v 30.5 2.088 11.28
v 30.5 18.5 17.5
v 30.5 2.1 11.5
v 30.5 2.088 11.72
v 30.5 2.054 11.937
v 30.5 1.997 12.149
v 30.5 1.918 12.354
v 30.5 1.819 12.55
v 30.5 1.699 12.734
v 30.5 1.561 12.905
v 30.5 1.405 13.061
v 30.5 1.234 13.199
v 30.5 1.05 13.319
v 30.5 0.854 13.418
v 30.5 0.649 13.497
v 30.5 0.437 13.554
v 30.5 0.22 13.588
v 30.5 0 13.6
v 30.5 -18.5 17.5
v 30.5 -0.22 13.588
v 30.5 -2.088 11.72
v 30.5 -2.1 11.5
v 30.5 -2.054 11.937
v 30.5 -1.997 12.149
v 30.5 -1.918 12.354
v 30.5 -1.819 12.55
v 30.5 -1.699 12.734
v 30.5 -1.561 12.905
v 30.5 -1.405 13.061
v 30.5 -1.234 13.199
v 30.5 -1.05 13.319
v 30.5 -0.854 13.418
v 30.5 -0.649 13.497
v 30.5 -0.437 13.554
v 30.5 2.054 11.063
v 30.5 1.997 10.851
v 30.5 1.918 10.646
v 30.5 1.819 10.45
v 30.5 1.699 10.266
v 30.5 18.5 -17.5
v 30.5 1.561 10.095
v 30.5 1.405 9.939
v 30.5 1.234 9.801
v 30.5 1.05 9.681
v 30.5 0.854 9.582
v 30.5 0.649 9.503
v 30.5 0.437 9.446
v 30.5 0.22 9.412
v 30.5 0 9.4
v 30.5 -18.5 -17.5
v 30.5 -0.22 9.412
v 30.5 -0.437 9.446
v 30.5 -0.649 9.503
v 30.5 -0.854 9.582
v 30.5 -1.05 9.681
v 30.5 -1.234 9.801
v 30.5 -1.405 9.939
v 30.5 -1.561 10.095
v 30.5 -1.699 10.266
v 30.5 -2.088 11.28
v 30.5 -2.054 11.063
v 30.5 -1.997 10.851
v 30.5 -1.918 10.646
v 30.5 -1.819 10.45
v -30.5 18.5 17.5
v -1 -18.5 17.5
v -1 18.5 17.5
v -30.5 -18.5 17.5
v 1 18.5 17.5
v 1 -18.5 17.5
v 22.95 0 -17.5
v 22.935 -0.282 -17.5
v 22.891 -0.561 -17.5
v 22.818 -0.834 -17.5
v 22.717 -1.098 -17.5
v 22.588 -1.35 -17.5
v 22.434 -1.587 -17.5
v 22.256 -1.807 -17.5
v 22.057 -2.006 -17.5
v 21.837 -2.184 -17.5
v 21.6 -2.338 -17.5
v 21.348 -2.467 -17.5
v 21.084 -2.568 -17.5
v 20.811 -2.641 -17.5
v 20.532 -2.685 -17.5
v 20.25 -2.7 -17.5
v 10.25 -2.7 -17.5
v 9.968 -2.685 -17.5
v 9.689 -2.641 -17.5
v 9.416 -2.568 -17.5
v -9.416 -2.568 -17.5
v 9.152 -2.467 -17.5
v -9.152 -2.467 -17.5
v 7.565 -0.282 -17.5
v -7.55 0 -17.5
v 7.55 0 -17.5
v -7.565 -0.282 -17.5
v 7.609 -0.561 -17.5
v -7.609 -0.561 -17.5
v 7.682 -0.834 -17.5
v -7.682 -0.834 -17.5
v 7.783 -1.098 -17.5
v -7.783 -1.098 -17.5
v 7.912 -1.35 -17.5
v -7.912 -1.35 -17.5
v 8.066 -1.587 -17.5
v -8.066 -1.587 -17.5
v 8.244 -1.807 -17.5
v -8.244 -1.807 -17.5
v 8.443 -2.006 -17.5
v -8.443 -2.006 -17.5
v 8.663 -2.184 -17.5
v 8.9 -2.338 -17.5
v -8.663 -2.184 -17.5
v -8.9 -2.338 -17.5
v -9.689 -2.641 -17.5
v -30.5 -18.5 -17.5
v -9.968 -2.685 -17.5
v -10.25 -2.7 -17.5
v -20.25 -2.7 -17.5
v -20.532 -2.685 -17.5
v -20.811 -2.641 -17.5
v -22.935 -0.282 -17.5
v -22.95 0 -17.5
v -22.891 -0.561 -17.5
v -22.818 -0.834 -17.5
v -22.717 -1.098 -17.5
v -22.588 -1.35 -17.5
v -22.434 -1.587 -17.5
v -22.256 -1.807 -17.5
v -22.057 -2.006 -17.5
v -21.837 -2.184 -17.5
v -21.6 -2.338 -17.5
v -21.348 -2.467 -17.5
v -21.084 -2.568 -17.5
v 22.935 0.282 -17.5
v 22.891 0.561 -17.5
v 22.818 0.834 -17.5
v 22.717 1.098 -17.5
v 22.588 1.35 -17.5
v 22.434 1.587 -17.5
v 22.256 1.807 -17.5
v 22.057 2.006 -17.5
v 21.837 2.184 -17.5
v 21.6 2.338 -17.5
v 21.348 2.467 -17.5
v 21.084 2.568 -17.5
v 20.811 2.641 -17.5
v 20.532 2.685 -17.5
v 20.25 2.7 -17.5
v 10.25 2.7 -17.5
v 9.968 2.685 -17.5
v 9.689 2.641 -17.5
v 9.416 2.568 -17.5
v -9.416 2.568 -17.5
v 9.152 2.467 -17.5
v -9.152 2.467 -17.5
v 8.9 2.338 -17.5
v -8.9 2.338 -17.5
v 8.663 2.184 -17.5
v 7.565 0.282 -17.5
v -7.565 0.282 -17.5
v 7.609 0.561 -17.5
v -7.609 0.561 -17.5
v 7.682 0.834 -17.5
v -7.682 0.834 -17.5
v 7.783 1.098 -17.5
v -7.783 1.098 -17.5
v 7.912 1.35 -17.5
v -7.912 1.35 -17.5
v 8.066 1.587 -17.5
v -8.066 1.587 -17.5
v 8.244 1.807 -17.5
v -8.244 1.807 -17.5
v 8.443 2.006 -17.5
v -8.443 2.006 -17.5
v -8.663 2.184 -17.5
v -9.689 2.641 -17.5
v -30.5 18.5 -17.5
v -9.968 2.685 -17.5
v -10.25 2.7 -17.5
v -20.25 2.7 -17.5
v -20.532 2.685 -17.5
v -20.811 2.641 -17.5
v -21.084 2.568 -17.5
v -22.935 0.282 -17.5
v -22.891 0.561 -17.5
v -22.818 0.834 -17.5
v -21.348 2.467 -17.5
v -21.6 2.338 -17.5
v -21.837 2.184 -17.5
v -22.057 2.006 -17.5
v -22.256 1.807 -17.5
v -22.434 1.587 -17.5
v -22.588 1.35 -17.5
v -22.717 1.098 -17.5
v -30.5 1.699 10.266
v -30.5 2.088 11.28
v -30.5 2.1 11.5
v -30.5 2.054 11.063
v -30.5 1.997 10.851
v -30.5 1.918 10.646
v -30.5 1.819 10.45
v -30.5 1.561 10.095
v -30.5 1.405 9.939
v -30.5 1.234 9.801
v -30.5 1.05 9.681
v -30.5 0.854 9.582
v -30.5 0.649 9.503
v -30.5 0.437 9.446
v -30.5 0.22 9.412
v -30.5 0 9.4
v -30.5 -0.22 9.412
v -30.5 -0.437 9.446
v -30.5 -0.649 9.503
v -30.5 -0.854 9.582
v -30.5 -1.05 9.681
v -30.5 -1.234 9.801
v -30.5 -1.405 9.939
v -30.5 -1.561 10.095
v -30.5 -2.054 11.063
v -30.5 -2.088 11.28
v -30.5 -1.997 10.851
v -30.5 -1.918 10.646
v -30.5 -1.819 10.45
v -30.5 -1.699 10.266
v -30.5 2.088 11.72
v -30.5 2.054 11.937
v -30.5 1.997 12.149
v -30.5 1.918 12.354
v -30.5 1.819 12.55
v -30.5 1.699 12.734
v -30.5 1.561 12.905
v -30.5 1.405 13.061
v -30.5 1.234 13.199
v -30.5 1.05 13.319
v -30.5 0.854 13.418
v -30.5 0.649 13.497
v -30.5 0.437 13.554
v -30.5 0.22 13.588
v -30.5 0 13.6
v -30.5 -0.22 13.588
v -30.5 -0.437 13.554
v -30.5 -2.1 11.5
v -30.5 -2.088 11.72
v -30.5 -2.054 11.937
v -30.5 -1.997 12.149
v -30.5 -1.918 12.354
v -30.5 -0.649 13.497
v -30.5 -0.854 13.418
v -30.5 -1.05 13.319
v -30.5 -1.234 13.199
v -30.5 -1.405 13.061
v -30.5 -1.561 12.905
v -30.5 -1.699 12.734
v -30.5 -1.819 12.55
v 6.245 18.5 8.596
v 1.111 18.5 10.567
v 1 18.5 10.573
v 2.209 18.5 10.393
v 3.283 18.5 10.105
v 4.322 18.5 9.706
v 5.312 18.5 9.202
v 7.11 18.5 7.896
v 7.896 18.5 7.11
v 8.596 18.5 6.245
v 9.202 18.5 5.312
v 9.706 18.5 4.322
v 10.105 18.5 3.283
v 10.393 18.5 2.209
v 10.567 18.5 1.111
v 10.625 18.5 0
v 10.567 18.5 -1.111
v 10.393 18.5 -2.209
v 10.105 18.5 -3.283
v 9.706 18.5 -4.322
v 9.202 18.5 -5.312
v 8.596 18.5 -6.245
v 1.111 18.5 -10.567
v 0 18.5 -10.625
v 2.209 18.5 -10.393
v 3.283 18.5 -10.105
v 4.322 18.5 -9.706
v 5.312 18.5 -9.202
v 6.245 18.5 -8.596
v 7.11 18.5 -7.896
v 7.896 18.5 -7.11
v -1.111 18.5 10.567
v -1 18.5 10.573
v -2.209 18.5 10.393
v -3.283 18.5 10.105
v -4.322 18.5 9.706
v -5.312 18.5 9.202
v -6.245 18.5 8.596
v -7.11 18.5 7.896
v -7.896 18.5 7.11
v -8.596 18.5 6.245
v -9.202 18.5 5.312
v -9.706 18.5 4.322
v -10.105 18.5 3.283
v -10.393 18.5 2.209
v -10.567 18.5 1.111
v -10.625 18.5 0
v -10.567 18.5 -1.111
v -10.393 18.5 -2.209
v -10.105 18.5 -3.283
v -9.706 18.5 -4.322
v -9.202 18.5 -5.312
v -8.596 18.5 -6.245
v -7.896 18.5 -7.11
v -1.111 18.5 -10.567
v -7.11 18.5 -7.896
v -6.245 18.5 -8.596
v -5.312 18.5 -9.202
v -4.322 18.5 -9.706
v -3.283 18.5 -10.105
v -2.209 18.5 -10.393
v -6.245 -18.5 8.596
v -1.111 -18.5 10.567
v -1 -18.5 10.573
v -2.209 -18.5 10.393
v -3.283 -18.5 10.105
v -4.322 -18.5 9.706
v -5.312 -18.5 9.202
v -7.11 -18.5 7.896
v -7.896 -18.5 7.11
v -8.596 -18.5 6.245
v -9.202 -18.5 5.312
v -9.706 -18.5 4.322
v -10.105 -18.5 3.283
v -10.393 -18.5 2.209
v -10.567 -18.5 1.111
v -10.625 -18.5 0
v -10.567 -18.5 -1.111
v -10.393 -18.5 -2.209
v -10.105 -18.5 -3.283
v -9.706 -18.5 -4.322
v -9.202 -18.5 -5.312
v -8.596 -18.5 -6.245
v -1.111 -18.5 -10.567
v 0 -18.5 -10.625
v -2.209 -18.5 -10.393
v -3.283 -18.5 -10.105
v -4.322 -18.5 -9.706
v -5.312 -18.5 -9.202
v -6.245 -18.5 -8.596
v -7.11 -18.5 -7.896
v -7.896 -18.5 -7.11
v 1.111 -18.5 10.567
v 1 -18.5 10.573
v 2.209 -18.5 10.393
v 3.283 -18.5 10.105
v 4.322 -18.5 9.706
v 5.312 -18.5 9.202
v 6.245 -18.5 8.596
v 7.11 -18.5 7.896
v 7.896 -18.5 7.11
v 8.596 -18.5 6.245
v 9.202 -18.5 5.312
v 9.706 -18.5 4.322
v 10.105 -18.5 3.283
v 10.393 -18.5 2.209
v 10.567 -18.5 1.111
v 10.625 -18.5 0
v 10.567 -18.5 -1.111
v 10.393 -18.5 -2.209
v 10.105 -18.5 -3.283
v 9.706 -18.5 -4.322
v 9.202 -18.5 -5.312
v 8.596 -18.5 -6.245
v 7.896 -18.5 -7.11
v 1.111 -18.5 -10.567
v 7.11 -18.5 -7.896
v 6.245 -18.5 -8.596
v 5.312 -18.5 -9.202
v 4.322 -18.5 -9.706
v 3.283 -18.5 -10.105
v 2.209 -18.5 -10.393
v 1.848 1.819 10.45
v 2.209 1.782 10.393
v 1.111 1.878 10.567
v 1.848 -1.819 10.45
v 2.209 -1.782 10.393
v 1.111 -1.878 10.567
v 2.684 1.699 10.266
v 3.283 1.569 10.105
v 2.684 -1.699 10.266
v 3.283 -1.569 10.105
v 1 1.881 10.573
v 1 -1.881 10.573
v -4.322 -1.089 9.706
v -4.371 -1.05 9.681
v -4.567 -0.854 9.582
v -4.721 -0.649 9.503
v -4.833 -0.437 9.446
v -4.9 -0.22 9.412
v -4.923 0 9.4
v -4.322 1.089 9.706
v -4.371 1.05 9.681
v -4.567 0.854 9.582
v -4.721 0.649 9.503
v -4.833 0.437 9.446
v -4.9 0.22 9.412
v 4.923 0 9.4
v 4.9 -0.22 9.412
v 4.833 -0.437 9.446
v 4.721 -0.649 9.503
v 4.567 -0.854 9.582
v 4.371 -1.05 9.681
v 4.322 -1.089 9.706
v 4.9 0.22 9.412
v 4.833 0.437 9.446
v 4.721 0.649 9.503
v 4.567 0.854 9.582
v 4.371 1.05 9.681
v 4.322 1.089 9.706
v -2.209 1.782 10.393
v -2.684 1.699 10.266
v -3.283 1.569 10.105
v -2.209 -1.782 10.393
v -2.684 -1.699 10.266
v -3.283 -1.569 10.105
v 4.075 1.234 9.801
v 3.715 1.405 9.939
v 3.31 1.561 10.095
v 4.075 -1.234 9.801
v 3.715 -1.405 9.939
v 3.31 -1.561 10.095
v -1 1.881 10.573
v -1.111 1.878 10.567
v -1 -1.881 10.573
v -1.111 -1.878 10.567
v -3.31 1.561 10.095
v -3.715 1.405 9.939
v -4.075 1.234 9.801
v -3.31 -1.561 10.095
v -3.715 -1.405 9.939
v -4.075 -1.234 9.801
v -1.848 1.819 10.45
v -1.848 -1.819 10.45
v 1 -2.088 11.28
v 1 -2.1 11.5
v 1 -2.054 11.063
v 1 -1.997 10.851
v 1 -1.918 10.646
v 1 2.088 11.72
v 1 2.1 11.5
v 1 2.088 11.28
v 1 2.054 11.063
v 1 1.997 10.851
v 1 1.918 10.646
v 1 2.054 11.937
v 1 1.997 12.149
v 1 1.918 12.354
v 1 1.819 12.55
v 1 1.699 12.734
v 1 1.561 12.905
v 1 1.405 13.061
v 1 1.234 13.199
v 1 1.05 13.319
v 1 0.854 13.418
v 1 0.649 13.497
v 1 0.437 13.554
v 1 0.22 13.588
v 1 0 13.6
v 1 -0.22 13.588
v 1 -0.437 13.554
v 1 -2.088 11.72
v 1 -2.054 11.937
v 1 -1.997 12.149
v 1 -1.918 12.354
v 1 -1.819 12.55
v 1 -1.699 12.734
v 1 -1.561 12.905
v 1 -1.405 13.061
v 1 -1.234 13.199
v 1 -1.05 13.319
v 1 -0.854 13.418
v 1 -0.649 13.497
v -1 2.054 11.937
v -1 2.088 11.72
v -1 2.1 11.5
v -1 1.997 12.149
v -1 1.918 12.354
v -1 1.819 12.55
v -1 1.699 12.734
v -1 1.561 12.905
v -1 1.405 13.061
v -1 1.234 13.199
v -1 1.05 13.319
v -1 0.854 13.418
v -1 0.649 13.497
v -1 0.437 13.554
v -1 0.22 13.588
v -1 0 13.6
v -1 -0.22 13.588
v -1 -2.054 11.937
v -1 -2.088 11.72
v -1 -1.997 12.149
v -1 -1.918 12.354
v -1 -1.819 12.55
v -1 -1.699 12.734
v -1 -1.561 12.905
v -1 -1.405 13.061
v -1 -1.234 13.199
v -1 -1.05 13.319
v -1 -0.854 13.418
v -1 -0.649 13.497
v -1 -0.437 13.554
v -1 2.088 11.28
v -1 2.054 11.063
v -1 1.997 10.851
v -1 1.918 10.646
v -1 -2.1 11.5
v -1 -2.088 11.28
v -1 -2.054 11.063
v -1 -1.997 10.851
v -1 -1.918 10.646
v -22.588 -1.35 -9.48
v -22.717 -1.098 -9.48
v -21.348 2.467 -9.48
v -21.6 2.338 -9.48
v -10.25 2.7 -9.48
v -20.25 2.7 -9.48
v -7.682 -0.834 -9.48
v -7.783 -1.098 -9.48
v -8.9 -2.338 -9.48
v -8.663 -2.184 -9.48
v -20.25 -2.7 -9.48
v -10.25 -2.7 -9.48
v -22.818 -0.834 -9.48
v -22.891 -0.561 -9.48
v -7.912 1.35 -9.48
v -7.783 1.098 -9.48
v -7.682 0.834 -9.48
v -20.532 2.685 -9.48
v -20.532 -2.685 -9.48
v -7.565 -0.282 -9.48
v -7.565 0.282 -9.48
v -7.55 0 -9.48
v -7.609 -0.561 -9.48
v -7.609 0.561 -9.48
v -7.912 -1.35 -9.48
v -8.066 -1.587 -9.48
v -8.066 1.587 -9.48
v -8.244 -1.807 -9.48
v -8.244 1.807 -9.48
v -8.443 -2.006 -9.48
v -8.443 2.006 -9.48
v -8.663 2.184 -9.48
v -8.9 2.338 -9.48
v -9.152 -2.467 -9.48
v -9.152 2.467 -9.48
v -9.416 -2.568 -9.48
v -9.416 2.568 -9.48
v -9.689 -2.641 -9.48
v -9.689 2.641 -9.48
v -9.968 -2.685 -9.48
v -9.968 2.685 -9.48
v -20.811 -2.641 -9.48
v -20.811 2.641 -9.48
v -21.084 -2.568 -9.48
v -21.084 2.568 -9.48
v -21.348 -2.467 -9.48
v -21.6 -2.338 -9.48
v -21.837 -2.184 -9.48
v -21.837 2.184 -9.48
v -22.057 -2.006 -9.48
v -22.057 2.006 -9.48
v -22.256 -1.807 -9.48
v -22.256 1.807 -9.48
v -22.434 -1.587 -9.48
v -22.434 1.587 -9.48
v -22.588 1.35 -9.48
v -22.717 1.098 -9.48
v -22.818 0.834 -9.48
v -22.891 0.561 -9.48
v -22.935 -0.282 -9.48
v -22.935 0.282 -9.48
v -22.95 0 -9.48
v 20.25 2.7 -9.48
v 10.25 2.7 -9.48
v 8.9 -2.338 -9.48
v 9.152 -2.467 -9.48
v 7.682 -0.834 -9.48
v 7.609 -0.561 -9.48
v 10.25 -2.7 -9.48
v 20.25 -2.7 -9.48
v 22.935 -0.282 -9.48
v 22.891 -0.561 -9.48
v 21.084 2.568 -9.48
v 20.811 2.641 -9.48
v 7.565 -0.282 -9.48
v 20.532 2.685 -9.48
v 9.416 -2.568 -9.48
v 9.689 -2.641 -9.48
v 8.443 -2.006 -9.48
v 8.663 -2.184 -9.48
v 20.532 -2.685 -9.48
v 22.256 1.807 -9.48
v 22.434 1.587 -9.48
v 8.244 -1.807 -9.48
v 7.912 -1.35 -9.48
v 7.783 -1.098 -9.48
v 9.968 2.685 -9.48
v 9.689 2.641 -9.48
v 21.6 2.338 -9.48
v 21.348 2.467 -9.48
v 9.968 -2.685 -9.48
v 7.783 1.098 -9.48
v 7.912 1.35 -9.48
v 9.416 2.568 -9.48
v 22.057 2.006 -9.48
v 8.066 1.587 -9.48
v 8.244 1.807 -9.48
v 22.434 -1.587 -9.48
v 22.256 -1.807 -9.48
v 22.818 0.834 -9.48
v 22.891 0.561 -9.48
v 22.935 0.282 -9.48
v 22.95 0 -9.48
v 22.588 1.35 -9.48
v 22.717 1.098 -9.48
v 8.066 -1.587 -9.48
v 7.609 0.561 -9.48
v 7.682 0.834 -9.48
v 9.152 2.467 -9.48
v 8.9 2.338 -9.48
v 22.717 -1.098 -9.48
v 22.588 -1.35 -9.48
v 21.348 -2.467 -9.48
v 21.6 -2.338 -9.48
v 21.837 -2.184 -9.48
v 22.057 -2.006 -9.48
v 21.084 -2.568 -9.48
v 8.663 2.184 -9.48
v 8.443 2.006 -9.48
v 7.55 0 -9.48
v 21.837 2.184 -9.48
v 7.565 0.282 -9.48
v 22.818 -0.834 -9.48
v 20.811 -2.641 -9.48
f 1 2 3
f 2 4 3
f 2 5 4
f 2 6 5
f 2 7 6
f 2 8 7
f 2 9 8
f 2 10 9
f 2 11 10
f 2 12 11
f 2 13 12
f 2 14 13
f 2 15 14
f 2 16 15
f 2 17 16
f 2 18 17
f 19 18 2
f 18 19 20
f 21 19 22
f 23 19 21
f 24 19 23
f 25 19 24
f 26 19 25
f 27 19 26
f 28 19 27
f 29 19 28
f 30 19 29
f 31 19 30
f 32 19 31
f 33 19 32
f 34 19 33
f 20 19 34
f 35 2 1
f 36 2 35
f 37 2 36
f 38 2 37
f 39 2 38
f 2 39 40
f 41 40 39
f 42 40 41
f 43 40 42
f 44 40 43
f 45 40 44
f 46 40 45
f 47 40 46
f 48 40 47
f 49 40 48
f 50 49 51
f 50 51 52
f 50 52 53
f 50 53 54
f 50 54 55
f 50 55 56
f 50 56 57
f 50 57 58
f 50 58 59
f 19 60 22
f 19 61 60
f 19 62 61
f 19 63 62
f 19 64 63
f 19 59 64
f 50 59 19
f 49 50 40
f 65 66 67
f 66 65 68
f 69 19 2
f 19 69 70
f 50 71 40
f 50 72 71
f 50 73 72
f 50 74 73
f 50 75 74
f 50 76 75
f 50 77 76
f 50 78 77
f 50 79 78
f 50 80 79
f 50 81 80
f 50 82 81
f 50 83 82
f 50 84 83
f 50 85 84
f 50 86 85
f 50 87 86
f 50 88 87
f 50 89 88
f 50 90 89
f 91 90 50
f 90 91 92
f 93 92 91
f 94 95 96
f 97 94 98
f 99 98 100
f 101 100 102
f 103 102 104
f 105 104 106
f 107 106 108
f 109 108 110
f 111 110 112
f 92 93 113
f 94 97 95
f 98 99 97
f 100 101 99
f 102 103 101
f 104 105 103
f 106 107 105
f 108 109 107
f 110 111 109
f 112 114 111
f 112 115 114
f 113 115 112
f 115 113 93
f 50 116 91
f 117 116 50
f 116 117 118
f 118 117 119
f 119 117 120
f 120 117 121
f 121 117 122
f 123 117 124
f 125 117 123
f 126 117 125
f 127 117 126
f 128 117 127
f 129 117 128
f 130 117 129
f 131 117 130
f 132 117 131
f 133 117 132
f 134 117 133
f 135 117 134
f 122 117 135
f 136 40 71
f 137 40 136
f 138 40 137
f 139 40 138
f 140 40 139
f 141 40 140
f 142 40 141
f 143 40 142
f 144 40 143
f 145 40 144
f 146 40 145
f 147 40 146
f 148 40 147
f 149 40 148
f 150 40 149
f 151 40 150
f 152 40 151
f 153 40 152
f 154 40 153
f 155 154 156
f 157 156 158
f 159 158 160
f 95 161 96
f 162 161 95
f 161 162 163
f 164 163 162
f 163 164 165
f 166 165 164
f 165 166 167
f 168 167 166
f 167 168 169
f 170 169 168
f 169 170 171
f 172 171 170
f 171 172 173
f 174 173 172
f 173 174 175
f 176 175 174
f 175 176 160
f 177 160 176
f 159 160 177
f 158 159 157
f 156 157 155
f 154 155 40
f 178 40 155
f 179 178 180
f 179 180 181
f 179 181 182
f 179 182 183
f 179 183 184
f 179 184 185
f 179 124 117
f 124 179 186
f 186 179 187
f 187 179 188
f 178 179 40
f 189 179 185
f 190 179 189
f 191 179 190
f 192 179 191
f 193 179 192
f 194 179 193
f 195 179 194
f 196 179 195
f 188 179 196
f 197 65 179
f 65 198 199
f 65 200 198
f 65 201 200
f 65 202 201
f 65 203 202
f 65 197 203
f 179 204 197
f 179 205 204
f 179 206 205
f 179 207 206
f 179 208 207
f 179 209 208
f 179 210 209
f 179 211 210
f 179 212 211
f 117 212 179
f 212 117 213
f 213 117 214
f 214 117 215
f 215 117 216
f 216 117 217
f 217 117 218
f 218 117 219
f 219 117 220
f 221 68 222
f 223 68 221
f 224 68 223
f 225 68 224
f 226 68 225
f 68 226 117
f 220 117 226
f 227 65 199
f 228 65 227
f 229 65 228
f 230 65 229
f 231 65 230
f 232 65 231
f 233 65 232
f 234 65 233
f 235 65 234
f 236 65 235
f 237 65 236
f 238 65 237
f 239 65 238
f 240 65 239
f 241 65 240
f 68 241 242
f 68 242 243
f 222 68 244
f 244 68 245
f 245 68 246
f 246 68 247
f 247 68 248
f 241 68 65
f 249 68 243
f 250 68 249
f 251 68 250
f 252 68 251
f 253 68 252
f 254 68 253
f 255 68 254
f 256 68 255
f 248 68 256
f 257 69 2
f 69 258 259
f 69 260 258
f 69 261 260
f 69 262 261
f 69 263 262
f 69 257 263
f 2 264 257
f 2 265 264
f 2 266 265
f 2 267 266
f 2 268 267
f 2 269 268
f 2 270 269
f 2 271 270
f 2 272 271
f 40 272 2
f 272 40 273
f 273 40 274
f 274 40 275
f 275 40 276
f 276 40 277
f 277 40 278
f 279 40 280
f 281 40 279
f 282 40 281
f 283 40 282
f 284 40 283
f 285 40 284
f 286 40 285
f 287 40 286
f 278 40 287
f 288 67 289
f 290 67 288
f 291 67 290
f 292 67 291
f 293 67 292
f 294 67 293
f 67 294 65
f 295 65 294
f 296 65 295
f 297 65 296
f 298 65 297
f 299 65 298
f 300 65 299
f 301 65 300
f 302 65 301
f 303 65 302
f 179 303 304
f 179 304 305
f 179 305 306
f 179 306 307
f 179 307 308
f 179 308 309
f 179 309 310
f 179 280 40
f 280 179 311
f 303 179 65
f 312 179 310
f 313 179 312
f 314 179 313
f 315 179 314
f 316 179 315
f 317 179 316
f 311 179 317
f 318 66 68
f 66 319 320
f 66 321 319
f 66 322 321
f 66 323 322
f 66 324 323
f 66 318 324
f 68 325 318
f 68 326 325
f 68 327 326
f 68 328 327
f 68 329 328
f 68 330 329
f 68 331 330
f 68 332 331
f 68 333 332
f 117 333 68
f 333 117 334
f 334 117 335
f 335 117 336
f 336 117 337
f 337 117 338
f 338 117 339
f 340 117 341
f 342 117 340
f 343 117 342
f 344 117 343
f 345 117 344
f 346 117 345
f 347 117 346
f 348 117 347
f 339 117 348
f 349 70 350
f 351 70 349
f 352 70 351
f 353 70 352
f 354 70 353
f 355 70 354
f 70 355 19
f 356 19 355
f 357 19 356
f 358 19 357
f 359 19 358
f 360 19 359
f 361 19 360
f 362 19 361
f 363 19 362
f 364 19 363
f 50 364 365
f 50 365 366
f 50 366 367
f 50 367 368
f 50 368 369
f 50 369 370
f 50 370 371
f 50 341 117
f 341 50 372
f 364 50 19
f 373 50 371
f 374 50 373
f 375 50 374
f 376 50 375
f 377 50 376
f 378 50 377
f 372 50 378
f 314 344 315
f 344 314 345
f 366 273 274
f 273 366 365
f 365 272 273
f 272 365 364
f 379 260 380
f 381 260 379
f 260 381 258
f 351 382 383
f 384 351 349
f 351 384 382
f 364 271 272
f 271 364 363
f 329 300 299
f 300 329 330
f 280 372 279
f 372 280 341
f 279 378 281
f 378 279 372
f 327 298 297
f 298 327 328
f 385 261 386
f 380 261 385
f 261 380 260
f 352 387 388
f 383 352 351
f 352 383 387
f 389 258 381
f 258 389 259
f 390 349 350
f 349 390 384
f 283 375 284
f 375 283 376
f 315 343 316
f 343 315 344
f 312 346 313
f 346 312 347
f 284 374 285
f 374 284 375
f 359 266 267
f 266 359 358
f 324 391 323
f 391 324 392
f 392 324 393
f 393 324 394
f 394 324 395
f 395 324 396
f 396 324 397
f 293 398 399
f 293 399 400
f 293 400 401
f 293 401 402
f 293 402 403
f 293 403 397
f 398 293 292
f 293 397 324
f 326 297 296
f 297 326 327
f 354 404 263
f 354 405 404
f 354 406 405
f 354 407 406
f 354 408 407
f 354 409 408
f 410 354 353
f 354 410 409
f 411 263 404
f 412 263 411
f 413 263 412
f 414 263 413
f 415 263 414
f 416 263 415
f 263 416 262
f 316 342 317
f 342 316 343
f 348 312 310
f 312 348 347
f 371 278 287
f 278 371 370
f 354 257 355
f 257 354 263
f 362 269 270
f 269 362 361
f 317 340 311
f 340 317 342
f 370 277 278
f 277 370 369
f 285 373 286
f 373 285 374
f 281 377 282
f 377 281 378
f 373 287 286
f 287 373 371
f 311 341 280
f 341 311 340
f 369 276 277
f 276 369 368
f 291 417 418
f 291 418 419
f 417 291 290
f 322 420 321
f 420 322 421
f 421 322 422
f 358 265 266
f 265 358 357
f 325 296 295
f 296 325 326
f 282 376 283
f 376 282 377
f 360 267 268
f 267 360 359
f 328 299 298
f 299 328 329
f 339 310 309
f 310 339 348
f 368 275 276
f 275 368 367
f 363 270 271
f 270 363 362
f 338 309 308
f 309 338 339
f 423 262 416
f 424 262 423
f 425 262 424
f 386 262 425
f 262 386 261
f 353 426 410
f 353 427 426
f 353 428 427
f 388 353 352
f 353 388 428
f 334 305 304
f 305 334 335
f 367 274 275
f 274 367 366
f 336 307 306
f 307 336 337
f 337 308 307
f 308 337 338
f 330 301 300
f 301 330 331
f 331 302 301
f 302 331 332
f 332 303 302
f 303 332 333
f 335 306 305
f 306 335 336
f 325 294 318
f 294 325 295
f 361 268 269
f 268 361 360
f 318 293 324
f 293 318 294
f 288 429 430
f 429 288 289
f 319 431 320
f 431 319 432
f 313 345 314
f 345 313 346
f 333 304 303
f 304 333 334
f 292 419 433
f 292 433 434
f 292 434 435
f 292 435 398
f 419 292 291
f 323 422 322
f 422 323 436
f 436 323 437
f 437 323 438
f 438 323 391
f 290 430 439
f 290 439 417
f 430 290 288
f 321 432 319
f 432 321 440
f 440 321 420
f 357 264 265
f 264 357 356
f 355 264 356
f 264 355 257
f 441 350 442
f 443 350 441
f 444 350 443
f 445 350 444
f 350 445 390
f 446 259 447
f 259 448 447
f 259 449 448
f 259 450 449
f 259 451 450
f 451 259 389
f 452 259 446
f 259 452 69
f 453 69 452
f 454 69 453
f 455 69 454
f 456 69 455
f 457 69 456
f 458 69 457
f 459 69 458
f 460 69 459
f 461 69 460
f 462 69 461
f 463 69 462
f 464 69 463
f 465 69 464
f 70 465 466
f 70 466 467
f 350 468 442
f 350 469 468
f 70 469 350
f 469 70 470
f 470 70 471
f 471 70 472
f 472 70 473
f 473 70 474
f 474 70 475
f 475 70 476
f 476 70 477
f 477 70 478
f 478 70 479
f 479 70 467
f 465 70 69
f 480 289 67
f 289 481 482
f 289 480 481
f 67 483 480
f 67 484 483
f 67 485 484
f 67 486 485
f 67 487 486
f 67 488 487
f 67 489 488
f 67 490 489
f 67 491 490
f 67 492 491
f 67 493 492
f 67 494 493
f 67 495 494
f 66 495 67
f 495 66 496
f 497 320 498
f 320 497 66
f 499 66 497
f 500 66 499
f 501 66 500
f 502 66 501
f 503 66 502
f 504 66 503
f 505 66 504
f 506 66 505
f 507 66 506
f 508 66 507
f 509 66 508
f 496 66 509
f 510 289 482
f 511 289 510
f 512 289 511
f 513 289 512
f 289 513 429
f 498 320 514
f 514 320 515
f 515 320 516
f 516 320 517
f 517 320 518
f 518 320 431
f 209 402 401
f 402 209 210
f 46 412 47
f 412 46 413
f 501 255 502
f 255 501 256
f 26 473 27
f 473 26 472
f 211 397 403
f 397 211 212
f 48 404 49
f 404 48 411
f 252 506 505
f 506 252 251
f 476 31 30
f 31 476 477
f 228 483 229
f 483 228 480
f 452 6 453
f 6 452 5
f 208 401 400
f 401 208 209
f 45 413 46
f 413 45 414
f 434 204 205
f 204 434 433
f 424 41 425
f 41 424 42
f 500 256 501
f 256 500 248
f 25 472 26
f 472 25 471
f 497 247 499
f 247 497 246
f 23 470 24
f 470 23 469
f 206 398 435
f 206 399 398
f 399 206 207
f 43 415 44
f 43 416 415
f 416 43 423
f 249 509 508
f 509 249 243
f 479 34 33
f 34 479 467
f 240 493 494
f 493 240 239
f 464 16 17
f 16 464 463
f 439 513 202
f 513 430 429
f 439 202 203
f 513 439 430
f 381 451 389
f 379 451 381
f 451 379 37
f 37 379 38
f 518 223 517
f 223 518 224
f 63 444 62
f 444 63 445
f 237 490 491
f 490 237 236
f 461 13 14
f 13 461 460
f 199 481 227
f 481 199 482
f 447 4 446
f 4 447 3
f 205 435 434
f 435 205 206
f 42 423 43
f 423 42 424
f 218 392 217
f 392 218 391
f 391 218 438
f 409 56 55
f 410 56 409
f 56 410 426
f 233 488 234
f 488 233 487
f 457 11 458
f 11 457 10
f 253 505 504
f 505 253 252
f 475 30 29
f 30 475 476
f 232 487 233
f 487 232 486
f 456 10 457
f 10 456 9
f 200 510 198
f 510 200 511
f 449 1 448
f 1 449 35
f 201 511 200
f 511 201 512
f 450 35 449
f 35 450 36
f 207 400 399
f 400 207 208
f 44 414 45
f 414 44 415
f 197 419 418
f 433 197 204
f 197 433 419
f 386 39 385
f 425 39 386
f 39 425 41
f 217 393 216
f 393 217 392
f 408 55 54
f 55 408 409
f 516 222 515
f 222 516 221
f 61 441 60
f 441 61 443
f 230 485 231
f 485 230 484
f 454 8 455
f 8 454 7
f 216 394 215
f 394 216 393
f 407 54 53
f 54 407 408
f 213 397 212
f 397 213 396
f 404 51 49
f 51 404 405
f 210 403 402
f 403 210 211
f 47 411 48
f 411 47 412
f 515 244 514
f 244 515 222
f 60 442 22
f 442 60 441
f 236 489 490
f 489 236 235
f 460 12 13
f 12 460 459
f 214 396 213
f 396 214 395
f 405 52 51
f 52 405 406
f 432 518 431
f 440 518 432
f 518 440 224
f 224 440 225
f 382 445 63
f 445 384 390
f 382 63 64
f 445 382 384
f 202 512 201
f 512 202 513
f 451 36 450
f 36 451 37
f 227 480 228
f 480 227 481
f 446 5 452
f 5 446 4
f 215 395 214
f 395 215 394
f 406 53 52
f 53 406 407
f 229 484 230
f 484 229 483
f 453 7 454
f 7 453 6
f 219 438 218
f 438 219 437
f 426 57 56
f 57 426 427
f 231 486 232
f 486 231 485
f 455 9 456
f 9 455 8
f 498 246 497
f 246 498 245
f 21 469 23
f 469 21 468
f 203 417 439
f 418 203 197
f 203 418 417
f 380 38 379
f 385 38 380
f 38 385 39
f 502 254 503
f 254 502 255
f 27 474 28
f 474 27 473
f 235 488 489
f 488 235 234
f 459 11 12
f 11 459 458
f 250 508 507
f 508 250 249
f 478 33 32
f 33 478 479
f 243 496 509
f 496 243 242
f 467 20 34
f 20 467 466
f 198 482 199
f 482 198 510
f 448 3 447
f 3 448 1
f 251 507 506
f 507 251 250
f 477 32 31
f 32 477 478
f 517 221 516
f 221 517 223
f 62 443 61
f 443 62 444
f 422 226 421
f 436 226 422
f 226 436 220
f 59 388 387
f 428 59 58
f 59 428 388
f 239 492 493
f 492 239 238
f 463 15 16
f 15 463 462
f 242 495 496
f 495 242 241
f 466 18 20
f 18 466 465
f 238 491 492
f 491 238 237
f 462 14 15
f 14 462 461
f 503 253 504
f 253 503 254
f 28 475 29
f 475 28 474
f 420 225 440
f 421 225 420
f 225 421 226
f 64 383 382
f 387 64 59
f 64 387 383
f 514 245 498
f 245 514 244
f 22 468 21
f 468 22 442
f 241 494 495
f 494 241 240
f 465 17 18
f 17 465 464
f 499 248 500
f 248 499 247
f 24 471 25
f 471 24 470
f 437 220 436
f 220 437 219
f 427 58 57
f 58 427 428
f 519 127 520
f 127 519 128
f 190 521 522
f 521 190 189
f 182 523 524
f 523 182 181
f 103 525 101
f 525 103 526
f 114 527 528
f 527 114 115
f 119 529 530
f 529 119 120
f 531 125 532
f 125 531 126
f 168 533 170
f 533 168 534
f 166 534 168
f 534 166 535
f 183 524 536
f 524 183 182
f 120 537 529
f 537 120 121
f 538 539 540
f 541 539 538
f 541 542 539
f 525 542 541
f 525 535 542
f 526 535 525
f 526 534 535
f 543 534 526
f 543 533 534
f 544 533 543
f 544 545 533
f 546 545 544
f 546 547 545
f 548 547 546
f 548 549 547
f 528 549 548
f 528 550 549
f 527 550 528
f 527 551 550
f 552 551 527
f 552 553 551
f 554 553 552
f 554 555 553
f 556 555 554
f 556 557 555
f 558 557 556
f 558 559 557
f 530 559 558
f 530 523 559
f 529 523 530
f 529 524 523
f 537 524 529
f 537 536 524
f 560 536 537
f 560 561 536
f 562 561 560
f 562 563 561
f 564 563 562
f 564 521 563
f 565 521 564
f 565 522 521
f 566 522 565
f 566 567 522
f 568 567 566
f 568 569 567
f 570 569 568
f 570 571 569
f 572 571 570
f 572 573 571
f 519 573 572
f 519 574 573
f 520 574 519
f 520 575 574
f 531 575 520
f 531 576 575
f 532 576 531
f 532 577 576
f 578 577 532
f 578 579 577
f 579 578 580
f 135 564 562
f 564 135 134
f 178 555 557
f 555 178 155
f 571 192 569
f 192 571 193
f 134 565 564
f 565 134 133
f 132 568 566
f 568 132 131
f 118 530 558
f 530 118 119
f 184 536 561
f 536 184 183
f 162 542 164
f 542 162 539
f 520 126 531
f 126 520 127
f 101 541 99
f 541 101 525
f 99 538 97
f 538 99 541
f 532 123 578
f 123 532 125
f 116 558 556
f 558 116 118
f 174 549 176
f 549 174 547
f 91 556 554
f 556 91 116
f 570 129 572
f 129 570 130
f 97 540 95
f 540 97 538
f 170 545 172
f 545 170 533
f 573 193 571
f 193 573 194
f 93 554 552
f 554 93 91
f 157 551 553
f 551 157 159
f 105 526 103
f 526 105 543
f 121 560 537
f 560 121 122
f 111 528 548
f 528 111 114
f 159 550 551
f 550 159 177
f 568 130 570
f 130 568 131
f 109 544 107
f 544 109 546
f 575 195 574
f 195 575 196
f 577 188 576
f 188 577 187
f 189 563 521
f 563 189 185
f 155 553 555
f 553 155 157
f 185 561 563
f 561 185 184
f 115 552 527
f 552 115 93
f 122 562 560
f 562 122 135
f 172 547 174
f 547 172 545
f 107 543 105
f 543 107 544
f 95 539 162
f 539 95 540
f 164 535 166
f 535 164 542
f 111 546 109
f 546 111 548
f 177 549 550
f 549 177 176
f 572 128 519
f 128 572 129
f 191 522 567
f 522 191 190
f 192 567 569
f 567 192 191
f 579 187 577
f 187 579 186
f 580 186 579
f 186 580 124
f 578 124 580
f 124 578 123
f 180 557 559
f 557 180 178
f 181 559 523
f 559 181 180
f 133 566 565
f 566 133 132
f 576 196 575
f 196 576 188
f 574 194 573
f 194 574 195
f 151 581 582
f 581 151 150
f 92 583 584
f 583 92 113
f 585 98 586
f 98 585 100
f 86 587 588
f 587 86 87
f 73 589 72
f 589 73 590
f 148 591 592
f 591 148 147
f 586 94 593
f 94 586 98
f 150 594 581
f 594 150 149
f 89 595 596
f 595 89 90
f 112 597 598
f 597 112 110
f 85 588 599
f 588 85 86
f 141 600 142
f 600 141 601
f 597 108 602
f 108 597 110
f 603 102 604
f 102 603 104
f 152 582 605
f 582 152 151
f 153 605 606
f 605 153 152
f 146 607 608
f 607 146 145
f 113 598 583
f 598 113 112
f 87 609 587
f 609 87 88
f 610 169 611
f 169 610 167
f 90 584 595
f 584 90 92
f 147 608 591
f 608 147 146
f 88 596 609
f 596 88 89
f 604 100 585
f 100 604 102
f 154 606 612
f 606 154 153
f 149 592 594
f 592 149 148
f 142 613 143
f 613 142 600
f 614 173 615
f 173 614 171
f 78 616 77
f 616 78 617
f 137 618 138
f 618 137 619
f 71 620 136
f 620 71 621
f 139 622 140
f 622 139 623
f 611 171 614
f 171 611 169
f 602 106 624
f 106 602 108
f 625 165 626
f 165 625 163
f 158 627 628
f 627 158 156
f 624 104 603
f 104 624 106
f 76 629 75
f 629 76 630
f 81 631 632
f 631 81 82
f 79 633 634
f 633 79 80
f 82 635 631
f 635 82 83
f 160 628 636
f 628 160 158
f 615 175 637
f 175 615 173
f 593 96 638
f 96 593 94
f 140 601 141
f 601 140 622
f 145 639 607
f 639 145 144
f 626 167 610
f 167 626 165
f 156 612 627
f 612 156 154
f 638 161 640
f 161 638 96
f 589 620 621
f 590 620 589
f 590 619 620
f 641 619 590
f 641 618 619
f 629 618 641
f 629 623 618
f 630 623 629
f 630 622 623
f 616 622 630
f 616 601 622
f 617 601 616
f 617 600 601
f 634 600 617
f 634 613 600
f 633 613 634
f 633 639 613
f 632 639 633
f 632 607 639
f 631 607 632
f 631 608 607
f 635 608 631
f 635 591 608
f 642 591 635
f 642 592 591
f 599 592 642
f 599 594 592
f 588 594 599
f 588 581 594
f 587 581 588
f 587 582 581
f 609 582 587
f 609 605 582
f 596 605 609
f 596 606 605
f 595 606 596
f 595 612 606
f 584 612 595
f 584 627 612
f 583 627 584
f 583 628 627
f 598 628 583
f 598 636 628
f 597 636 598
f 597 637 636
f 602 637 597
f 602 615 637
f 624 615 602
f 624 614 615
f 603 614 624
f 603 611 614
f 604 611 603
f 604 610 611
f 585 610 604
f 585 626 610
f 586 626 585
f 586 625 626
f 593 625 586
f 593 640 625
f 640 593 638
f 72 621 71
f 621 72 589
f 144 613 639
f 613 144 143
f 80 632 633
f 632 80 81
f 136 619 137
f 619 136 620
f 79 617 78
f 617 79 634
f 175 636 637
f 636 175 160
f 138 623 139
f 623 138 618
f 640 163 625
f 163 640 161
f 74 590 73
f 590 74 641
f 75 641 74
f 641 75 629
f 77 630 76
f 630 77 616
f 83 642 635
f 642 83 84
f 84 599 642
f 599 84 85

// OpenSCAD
// Split housing for 21 mm OD linear bearing.
$fn = 60;
eps = 0.02;
bearing_d = 21;
body_l = 61;
body_d = 37;
body_h = 35;
slot_w = 2;
module mount_slot(x) {
    hull() {
        translate([x - 5, 0, -body_h / 2 - eps]) cylinder(d = 5.4, h = 8 + 2 * eps);
        translate([x + 5, 0, -body_h / 2 - eps]) cylinder(d = 5.4, h = 8 + 2 * eps);
    }
}
difference() {
    cube([body_l, body_d, body_h], center = true);
    translate([0, -body_d / 2 - eps, 0]) rotate([-90, 0, 0]) cylinder(d = bearing_d + 0.25, h = body_d + 2 * eps);
    translate([-slot_w / 2, -body_d / 2 - eps, 0]) cube([slot_w, body_d + 2 * eps, body_h / 2 + eps]);
    translate([-body_l / 2 - eps, 0, body_h / 2 - 6]) rotate([0, 90, 0]) cylinder(d = 4.2, h = body_l + 2 * eps);
    mount_slot(-body_l / 4);
    mount_slot(body_l / 4);
}
